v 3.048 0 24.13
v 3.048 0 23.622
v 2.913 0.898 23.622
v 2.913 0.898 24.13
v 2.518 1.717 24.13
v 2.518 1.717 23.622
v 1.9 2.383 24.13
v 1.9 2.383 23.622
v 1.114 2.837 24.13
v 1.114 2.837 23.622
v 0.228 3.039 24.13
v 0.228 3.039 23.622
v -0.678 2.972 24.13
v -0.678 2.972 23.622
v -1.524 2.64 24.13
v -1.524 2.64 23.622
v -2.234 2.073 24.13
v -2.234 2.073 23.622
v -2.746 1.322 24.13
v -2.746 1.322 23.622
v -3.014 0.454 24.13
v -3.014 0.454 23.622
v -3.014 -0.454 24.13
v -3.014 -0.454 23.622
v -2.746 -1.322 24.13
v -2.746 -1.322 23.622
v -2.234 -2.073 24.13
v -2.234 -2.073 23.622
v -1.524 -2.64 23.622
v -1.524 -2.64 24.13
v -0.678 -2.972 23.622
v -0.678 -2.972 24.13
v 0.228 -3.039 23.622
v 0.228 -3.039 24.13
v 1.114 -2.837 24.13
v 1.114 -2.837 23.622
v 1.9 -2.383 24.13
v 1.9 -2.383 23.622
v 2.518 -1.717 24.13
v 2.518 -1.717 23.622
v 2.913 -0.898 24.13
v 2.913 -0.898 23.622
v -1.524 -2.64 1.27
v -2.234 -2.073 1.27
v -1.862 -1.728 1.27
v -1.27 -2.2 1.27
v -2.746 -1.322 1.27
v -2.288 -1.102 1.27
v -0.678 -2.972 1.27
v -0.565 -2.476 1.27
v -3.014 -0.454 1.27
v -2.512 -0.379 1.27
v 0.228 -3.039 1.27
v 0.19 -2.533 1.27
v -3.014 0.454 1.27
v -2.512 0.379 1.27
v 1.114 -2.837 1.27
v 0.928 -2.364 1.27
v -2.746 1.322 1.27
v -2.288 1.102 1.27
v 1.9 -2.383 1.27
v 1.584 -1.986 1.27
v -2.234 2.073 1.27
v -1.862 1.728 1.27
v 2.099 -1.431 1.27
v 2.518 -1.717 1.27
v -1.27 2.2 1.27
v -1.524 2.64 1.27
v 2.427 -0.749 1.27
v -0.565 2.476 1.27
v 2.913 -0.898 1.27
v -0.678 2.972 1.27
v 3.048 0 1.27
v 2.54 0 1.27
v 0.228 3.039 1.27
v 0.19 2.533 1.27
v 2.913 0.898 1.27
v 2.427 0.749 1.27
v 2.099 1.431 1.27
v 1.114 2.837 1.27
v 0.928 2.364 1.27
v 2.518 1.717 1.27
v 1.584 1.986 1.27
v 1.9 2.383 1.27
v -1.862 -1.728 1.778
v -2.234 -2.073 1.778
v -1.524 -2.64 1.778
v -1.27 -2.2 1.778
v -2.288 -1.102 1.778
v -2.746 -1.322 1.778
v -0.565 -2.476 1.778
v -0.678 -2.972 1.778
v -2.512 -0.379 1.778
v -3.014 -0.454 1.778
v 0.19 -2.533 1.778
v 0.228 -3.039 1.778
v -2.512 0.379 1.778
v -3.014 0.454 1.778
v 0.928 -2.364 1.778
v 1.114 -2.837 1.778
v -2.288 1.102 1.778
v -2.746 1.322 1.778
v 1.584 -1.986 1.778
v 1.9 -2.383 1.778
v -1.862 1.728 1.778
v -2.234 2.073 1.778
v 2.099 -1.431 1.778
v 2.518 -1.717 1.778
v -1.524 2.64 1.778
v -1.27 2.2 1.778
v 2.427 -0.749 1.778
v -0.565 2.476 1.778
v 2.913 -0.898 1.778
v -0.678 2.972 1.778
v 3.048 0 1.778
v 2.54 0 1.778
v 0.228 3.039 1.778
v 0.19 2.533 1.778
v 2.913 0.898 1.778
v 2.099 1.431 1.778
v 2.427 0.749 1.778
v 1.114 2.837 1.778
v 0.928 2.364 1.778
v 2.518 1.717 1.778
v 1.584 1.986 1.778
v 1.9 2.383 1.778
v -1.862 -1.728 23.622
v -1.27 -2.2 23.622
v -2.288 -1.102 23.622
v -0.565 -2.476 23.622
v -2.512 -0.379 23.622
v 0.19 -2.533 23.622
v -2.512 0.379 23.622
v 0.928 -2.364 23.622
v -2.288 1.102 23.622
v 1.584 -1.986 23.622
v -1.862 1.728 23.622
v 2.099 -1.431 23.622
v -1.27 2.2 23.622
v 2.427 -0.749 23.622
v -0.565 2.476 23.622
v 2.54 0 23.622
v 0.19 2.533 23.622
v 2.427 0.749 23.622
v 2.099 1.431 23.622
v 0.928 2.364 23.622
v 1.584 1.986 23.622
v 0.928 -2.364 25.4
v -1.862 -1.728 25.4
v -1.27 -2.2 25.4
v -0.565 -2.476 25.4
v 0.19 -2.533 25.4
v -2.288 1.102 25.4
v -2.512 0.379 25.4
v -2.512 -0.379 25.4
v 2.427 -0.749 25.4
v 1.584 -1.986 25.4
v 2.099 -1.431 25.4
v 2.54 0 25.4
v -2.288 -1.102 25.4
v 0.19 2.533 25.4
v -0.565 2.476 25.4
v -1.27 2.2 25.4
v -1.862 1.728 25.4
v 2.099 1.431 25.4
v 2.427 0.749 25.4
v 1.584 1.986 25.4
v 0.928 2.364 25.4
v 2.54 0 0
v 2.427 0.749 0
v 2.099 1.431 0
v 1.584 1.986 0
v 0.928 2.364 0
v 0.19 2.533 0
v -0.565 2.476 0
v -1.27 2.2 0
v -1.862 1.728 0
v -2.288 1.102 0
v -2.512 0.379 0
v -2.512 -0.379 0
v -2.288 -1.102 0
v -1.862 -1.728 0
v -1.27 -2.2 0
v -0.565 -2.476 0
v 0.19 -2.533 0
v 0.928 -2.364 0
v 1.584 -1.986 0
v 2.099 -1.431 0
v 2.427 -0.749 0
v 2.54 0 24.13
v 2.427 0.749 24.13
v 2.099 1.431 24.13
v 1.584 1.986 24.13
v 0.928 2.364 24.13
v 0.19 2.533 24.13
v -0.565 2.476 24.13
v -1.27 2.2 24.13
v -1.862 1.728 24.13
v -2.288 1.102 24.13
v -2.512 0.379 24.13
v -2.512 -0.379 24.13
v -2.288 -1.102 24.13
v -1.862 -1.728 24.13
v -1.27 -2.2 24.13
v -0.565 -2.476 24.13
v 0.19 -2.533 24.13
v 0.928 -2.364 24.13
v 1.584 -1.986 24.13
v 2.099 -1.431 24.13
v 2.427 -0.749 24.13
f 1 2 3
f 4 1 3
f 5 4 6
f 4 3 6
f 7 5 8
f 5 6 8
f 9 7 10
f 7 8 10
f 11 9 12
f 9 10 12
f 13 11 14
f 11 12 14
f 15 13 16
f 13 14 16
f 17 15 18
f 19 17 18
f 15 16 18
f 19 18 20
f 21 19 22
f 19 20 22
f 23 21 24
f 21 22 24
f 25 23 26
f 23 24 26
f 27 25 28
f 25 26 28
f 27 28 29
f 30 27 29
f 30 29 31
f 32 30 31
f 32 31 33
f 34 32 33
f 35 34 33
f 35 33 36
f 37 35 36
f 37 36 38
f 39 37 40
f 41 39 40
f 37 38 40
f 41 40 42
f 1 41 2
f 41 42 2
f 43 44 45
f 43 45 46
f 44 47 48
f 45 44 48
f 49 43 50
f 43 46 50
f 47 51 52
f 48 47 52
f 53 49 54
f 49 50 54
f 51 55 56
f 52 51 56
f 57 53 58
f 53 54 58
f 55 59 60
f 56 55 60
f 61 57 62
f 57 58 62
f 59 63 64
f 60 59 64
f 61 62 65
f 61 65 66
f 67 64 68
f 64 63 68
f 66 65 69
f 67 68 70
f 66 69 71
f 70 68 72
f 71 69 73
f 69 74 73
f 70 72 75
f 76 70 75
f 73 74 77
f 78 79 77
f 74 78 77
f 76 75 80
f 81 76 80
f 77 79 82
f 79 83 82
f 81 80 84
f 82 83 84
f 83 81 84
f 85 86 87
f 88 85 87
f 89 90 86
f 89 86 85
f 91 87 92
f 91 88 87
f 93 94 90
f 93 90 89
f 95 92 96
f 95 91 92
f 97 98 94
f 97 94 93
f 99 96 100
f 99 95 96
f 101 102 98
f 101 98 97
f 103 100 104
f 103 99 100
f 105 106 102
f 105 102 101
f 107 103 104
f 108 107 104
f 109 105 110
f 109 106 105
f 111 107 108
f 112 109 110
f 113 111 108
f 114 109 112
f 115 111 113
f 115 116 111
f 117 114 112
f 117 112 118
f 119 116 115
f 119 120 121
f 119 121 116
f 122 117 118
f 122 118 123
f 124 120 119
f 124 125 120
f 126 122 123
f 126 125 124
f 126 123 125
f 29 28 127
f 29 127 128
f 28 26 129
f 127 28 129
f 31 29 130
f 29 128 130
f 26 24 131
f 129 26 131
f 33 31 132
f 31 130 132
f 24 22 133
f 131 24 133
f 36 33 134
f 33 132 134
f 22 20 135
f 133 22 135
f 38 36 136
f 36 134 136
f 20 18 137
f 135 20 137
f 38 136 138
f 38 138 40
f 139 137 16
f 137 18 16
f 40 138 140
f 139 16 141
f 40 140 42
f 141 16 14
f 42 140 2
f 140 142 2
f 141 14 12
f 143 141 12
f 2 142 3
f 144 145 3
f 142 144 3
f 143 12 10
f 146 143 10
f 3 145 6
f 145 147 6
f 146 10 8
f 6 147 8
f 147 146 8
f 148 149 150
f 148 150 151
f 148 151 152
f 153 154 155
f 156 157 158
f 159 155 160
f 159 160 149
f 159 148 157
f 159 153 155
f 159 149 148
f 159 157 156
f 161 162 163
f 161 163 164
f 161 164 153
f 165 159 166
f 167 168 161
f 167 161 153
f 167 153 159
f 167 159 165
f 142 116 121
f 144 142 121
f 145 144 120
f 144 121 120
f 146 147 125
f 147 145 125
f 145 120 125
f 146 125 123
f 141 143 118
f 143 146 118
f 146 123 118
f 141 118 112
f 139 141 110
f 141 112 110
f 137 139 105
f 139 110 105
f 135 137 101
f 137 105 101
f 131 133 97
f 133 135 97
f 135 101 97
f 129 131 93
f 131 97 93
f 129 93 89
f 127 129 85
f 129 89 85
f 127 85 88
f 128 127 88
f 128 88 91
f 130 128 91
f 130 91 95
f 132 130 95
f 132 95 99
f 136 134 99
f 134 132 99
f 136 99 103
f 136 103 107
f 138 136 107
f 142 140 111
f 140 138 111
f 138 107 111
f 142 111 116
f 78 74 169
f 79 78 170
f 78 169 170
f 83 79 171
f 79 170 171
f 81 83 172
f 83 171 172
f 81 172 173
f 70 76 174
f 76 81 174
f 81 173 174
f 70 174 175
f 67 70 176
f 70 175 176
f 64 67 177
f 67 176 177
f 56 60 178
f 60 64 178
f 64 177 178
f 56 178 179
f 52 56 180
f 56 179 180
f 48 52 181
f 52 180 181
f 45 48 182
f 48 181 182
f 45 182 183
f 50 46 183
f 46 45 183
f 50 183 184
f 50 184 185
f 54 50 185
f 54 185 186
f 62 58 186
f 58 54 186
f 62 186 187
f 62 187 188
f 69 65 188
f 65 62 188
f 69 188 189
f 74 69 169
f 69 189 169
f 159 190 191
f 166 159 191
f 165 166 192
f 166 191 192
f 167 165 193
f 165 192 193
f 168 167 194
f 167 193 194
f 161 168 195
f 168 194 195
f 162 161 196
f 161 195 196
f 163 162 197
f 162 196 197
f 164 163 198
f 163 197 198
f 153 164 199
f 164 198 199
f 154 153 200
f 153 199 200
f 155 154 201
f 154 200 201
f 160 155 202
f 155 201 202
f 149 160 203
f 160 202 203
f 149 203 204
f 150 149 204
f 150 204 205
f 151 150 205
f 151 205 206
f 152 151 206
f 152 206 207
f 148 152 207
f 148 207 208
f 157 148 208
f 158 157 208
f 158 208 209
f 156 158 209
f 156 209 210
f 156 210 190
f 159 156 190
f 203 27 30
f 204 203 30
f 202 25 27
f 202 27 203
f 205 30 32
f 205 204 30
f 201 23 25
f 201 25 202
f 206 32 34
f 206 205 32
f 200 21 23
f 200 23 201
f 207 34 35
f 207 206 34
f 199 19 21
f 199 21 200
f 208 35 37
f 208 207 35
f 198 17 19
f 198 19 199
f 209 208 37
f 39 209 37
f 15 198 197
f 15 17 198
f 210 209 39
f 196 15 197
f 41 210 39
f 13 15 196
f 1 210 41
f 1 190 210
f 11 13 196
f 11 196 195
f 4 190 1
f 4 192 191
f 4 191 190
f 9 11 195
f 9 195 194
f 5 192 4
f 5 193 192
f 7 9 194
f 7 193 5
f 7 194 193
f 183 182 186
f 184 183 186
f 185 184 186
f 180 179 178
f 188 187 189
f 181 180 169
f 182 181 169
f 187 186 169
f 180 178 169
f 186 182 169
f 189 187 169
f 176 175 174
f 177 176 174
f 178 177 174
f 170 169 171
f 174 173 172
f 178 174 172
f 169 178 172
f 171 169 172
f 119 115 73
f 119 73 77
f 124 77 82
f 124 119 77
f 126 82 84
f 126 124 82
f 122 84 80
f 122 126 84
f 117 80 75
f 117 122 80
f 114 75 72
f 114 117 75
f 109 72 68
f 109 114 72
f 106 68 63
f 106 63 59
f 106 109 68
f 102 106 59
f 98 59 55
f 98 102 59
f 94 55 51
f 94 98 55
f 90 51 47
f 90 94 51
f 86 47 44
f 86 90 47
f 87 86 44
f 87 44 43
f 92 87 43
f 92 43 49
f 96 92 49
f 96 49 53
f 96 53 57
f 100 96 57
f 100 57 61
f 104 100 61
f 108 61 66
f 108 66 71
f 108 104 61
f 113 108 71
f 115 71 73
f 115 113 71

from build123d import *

# Parameters (mm, degrees)
F0_R     = 2.54
F1_DEPTH = 25.4
F5_R     = 3.048
F6_DEPTH = 0.508
F4_R     = 3.048
F7_DEPTH = 0.508


with BuildPart() as f1:
    # F0 (on Top) → F1 (new body)
    with BuildSketch(Plane.XY):
        Circle(F0_R)
    extrude(amount=F1_DEPTH)

    # F5 (on offset) → F6 (join)
    with BuildSketch(Plane.XY.offset(23.622)):
        Circle(F5_R)
    extrude(amount=F6_DEPTH)

    # F4 (on offset) → F7 (join)
    with BuildSketch(Plane.XY.offset(1.778)):
        Circle(F4_R)
    extrude(amount=-F7_DEPTH)


solid = f1.part
